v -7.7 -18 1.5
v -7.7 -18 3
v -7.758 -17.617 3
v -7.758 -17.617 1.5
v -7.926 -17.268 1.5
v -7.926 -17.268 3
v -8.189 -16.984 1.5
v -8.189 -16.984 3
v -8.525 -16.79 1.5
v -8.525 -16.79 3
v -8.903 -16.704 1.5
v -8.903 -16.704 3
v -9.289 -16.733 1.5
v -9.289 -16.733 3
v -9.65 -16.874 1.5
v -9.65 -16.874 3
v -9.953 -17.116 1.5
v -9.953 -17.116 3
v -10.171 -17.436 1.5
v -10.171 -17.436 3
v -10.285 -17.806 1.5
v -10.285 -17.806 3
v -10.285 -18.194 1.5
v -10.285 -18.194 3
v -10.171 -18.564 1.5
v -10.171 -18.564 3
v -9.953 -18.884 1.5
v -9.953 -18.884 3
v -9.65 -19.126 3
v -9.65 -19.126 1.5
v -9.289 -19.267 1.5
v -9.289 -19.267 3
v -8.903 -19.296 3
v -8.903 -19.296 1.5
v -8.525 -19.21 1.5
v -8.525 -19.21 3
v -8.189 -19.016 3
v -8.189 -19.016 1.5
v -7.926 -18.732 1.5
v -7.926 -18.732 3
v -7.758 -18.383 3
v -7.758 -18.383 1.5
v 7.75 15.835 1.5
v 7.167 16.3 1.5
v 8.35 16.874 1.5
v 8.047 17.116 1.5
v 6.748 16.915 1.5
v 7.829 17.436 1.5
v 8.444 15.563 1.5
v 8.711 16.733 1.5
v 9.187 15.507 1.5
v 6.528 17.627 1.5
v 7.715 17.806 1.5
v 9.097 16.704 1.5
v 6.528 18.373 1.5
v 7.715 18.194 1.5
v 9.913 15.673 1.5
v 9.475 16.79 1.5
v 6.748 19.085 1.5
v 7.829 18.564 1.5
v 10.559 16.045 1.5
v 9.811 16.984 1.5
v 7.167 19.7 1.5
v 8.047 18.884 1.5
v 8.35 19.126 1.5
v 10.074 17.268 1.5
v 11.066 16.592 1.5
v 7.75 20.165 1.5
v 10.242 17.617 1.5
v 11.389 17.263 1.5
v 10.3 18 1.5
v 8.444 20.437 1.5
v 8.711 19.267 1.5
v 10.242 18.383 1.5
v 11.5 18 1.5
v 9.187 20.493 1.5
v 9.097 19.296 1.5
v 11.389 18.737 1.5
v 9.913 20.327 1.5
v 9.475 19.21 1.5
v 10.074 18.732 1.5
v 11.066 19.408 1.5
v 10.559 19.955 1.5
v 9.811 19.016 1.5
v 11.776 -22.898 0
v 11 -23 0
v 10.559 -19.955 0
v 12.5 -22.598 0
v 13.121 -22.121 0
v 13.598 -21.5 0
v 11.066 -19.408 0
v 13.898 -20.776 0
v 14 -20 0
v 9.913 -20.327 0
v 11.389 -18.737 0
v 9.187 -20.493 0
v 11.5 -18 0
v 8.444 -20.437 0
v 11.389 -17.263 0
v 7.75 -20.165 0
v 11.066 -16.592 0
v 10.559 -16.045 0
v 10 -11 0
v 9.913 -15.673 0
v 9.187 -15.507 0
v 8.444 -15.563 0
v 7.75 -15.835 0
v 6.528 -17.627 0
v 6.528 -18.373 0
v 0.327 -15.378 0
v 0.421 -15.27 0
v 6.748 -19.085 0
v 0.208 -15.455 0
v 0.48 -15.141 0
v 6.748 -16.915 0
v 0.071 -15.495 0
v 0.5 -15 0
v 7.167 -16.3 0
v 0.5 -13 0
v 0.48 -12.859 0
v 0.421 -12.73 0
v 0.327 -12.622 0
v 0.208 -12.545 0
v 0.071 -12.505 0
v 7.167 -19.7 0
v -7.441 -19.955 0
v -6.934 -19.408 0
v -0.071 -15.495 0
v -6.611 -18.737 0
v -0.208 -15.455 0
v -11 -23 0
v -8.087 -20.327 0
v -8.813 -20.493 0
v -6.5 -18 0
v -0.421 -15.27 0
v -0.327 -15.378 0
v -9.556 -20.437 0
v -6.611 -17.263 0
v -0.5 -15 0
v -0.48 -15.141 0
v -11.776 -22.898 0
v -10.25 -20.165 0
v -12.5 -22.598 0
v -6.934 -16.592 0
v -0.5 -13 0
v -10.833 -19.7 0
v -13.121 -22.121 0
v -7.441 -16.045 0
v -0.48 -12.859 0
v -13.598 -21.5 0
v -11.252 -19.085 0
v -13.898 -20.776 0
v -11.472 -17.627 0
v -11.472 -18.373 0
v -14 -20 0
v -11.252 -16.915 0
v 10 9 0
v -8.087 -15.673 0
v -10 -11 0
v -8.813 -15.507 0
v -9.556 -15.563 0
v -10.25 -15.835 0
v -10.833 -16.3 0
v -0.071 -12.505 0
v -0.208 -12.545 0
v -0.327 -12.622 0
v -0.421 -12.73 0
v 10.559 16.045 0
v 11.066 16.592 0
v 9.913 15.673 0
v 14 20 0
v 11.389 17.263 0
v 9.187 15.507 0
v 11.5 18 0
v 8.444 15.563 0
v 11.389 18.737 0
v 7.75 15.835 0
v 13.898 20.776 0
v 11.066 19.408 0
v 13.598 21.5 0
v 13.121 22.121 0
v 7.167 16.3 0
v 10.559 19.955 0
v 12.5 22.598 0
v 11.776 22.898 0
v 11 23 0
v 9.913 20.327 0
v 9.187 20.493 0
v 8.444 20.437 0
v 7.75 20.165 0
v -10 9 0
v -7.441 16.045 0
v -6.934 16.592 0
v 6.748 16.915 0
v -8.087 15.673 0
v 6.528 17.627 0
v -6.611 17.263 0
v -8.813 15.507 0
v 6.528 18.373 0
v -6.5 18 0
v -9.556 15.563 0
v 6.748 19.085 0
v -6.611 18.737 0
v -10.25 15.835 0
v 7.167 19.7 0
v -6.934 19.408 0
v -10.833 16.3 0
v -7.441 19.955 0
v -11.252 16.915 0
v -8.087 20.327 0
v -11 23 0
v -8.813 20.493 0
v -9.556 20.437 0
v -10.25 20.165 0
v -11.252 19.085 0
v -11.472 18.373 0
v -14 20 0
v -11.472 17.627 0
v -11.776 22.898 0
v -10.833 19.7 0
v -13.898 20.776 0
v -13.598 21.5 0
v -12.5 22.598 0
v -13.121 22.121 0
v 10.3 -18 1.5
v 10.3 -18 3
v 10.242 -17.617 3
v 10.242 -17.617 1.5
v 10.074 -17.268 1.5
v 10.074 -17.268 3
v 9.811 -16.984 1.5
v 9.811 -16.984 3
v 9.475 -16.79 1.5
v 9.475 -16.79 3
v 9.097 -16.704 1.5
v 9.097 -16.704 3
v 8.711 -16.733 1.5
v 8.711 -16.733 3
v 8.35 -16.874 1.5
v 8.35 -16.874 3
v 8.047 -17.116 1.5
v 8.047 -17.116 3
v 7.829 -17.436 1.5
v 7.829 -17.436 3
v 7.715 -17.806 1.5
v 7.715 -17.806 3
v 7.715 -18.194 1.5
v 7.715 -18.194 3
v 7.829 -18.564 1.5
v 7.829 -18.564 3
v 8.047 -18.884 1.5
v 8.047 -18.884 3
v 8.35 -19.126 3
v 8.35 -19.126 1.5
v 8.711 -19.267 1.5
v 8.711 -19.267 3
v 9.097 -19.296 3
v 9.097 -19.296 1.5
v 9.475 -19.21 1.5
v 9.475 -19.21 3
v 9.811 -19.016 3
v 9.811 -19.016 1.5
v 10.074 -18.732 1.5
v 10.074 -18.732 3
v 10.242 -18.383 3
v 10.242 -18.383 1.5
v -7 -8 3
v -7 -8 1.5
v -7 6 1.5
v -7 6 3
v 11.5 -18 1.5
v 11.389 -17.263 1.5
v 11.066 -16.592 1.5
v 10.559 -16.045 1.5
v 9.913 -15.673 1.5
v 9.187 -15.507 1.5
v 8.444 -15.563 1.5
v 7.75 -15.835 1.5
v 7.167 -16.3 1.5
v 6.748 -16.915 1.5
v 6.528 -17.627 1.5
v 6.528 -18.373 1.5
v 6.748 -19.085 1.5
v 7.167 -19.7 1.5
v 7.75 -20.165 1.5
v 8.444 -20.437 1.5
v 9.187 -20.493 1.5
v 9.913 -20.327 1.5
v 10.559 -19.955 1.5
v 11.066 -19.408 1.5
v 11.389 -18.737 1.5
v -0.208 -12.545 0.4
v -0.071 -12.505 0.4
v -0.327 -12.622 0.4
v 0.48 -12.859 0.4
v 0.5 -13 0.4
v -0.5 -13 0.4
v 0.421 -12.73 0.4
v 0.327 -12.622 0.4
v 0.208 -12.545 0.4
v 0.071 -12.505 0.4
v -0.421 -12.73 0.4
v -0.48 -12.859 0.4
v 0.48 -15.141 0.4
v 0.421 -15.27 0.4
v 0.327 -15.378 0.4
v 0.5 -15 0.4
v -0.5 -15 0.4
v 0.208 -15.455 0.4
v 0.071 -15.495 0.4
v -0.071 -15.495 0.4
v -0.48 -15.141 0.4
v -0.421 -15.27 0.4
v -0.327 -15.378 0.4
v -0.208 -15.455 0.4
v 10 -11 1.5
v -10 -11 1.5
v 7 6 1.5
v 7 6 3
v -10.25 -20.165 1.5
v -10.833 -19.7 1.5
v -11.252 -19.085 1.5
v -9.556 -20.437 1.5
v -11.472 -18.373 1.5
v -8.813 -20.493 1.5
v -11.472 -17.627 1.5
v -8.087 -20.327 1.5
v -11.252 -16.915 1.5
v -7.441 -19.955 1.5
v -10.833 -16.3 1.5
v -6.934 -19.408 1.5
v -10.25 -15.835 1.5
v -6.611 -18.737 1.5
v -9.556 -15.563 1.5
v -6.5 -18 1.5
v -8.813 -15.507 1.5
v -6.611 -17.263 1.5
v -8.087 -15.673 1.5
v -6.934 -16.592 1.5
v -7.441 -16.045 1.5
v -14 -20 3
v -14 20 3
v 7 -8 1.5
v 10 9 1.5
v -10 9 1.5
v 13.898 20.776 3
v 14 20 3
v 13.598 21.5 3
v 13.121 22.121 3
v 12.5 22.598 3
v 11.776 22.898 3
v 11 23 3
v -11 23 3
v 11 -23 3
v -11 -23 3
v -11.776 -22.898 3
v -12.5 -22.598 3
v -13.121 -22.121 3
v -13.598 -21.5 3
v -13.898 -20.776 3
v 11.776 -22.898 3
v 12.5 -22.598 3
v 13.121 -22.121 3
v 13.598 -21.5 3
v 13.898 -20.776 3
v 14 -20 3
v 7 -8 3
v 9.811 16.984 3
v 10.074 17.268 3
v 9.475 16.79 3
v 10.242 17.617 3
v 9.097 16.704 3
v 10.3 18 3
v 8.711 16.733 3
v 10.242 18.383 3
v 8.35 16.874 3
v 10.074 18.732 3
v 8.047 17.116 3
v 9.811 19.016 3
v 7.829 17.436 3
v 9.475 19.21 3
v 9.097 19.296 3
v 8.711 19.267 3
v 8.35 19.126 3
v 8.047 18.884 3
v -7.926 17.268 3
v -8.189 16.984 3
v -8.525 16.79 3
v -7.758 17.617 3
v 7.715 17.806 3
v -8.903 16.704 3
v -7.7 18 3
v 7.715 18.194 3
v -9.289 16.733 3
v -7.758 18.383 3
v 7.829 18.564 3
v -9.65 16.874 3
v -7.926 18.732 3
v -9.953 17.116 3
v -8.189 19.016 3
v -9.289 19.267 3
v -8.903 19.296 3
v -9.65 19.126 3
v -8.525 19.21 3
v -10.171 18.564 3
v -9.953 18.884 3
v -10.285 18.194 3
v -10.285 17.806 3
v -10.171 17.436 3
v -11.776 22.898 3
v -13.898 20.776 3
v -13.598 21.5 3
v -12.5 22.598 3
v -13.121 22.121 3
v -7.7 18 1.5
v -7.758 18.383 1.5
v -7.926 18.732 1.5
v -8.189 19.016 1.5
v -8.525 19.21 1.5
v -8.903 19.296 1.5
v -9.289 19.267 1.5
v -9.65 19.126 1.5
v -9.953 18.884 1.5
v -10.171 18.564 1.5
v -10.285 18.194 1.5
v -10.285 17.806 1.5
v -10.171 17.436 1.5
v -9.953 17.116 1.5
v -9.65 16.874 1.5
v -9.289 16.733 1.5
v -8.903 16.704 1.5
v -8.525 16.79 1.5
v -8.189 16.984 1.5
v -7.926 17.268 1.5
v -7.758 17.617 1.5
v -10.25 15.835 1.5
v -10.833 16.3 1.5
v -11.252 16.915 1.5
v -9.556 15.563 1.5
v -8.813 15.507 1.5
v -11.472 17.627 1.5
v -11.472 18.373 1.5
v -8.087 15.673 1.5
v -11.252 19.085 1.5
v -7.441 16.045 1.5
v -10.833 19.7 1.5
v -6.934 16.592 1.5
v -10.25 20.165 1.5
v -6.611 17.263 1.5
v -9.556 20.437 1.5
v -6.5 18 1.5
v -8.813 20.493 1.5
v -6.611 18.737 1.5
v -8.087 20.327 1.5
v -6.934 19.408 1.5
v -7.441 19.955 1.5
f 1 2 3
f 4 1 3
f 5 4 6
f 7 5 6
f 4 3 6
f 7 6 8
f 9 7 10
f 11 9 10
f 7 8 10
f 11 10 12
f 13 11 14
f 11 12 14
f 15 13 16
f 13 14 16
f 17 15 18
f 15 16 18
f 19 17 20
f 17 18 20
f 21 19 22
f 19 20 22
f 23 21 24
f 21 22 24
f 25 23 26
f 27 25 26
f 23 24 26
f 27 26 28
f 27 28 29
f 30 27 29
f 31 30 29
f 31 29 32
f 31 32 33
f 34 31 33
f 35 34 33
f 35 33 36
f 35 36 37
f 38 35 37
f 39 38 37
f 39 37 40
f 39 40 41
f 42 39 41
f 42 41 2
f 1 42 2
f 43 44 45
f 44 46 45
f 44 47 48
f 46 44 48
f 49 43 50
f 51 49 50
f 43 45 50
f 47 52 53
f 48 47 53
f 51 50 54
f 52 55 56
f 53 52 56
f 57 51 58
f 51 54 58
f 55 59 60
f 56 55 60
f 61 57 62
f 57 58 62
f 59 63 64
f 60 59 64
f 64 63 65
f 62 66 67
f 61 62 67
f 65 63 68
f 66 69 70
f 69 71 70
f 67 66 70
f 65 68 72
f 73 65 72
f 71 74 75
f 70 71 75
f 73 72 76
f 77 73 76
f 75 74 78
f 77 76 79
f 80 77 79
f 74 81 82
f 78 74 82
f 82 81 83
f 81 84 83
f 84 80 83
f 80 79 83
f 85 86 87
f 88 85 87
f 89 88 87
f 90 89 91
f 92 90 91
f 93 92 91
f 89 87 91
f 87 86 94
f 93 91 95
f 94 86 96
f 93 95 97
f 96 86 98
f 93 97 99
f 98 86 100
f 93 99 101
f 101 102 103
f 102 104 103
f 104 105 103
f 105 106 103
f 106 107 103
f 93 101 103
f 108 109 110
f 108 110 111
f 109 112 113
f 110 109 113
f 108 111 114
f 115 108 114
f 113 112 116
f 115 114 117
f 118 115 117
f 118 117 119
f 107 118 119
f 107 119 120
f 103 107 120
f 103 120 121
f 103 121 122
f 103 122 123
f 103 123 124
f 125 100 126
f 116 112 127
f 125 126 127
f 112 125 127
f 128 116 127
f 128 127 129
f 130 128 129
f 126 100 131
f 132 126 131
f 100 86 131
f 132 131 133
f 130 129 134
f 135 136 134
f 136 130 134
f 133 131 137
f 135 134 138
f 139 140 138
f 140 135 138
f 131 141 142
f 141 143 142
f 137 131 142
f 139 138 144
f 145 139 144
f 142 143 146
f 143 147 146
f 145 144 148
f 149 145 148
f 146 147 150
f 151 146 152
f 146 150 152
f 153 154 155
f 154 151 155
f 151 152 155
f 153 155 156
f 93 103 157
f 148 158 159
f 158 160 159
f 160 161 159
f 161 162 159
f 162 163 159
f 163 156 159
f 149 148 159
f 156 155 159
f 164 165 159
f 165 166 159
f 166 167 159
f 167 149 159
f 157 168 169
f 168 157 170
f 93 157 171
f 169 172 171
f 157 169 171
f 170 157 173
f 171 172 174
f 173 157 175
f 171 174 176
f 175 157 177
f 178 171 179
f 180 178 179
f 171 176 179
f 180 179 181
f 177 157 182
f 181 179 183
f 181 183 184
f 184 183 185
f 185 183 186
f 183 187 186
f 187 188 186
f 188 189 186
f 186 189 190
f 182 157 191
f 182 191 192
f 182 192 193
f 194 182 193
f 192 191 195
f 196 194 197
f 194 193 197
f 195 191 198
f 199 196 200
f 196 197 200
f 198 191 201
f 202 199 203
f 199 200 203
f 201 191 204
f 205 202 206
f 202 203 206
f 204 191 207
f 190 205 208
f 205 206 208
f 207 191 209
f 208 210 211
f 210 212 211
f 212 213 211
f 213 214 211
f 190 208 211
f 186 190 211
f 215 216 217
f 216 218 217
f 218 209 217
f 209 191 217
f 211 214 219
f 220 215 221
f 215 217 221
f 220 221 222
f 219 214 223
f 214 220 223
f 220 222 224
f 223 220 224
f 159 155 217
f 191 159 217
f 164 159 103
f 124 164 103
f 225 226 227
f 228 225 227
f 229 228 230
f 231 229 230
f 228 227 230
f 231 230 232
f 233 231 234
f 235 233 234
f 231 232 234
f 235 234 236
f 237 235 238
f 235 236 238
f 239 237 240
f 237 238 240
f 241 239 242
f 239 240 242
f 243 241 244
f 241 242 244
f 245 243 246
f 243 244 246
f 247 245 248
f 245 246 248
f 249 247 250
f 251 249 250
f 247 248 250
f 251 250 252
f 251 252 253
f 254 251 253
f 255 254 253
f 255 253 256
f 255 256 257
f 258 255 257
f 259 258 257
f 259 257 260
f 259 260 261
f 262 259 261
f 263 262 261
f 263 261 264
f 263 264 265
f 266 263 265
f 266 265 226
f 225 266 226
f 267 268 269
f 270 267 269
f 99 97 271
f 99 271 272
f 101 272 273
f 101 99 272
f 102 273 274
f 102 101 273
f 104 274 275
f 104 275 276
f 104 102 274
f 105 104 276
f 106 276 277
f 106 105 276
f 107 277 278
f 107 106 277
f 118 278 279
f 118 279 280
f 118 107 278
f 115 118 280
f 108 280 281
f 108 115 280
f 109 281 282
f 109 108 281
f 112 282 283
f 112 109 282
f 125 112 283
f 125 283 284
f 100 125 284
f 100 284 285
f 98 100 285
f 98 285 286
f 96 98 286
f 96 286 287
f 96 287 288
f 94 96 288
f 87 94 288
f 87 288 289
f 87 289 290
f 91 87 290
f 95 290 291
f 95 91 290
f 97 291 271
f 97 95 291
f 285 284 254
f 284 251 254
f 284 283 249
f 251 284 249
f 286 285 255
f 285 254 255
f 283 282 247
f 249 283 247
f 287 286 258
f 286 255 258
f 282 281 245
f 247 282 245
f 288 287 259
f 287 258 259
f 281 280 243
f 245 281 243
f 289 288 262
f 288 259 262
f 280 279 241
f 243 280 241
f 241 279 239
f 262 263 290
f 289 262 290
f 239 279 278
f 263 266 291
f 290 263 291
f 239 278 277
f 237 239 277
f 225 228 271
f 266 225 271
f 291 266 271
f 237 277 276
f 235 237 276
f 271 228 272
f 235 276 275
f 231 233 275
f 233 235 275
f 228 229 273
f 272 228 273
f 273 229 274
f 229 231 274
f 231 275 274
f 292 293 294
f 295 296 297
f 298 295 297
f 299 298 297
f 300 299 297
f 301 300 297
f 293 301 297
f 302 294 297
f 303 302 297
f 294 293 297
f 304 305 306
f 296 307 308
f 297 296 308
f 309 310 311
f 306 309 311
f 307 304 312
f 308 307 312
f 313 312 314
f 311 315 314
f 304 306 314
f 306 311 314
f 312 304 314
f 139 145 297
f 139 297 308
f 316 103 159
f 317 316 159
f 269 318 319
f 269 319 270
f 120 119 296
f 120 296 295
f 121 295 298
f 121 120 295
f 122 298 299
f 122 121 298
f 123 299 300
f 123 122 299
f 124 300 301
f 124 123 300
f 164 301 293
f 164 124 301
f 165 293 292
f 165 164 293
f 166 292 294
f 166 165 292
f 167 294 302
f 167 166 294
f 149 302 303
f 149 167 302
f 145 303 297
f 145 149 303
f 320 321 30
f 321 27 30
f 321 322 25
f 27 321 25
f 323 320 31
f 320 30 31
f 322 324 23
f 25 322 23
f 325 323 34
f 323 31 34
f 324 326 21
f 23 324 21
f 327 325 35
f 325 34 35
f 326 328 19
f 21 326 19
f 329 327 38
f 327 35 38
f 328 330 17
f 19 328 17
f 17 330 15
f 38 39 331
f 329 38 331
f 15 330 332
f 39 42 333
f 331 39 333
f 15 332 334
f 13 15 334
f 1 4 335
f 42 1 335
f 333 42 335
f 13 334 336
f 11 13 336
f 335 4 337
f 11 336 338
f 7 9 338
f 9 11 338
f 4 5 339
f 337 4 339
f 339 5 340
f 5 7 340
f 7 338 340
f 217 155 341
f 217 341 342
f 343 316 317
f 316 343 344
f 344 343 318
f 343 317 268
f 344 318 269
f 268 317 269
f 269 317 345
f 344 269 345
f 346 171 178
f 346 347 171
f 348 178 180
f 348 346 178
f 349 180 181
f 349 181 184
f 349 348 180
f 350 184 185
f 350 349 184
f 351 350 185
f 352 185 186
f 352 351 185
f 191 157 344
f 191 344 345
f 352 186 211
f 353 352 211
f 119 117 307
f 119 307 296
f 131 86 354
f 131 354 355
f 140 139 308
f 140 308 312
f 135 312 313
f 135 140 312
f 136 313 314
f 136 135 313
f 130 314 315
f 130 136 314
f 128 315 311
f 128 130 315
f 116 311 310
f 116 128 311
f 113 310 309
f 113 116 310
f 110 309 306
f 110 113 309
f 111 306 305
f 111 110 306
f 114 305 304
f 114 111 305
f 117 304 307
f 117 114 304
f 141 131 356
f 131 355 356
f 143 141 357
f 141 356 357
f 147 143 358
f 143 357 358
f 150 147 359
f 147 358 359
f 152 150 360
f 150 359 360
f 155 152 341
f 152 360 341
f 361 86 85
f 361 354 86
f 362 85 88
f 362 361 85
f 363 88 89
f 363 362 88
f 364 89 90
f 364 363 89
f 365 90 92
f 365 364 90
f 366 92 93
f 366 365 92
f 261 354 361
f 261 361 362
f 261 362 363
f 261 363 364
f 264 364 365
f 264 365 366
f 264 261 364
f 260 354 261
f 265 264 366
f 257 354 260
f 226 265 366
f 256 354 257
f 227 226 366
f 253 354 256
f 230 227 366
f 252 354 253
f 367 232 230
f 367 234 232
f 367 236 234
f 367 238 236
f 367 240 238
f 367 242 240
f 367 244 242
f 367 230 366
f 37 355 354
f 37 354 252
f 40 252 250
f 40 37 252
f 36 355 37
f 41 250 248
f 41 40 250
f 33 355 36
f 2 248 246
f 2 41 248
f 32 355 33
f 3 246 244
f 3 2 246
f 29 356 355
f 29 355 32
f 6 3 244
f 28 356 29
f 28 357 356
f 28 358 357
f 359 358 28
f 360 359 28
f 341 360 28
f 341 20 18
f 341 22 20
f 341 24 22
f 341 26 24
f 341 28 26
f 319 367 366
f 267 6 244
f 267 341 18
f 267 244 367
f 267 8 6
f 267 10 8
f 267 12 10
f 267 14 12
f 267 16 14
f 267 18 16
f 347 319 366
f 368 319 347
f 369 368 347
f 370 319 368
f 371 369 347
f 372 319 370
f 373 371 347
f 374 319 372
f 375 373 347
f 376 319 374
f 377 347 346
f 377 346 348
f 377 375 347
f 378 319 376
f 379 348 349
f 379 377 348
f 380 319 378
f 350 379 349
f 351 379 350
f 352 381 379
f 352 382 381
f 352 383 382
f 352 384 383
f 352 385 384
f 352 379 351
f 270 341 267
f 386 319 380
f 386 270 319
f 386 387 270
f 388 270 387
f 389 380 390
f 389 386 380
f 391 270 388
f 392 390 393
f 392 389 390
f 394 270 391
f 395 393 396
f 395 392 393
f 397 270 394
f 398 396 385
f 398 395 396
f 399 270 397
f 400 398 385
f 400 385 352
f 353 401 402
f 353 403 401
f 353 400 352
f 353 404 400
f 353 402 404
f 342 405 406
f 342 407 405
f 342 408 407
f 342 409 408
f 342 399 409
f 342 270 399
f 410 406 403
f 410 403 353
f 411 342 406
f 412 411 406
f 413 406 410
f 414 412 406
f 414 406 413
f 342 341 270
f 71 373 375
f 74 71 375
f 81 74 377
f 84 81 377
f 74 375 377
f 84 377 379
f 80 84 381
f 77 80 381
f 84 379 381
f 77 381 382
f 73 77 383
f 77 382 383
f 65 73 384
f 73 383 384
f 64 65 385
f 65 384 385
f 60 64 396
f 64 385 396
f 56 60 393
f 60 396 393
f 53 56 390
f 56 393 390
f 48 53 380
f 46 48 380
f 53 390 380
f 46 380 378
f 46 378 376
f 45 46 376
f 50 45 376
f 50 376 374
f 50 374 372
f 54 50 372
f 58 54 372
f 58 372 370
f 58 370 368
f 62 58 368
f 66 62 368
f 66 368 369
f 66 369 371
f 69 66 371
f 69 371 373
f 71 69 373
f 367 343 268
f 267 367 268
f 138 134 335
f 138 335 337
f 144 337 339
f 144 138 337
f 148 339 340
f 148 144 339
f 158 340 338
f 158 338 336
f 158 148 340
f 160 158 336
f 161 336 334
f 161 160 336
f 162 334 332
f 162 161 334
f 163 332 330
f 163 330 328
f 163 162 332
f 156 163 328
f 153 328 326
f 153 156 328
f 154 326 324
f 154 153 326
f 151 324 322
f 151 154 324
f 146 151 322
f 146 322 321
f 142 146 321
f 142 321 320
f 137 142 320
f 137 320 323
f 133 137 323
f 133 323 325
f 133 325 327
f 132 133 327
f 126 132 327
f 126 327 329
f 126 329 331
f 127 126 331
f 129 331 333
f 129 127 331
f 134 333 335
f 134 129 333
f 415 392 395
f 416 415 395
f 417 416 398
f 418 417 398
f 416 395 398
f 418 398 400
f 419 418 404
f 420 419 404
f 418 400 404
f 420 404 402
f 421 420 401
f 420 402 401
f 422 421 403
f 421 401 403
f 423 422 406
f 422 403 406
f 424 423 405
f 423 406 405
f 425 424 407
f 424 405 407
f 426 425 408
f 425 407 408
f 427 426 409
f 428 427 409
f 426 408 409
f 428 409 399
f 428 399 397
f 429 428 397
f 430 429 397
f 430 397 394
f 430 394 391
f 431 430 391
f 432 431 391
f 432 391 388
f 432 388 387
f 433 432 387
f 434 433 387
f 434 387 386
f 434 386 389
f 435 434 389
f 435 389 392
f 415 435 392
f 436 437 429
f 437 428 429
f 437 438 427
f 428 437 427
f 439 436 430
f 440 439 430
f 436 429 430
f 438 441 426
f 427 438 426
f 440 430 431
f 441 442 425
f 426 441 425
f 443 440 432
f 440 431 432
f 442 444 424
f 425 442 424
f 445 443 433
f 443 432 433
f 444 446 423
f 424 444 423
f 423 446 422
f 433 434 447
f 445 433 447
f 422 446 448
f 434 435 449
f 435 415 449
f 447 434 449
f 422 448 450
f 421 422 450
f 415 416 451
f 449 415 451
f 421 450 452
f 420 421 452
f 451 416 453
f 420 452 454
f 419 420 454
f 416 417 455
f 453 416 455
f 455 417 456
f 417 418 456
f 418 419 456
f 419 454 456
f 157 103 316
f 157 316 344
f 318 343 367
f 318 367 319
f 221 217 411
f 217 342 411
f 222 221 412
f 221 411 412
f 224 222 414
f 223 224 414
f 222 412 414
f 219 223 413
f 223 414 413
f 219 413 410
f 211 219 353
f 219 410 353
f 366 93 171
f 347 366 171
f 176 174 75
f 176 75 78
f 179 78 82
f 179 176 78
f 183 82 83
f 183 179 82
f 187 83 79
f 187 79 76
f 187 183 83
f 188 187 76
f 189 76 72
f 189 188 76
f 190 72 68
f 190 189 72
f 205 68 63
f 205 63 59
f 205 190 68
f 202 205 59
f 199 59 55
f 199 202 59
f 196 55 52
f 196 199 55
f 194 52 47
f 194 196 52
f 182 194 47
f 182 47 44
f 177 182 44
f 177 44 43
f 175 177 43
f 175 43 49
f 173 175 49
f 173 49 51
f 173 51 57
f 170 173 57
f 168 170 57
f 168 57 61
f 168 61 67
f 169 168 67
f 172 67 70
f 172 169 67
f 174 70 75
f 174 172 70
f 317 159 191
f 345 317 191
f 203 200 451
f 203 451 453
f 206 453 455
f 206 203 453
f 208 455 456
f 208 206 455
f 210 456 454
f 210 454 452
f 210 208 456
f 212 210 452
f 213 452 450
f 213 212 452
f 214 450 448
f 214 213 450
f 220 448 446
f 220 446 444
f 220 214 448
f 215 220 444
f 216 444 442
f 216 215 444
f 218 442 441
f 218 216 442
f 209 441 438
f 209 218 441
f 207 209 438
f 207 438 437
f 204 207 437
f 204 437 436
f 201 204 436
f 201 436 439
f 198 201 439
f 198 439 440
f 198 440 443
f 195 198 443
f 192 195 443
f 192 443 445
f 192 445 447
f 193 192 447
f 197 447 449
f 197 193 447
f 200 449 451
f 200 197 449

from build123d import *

# Parameters (mm, degrees)
SKETCH2_W                  = 46
SKETCH2_H                  = 28
SKETCH2_W_2                = 14
SKETCH2_H_2                = 14
BOSS_EXTRUDE1_DEPTH        = 3
F_2_6_2_6_DIAMETER_HOLE1_D = 2.6
SKETCH2_6_W                = 20
SKETCH2_6_H                = 20
SKETCH2_6_R                = 2.5
CUT_EXTRUDE2_DEPTH         = 1.5
FILLET1_R                  = 3
CUT_EXTRUDE3_DEPTH         = 0.4


with BuildPart() as part:
    # Sketch2 → Boss-Extrude1 (new body)
    with BuildSketch(Plane(origin=(0, 0, 0), x_dir=(0, 1, 0), z_dir=(0, 0, 1))):
        Rectangle(SKETCH2_W, SKETCH2_H)
        with Locations((-1, 0)):
            Rectangle(SKETCH2_W_2, SKETCH2_H_2, mode=Mode.SUBTRACT)
    extrude(amount=BOSS_EXTRUDE1_DEPTH)

    # Ø2.6 (2.6) Diameter Hole1 (through all)
    with Locations(Plane(origin=(0, 0, 0), x_dir=(-1, 0, 0), z_dir=(0, 0, -1))):
        with Locations((-9, -18), (9, -18), (-9, 18), (9, 18)):
            Hole(F_2_6_2_6_DIAMETER_HOLE1_D / 2)

    # Sketch2<6> → Cut-Extrude2 (cut)
    with BuildSketch(Plane(origin=(0, 0, 0), x_dir=(0, 1, 0), z_dir=(0, 0, 1))):
        with Locations((-1, 0)):
            Rectangle(SKETCH2_6_W, SKETCH2_6_H)
        with Locations((-18, 9)):
            Circle(SKETCH2_6_R)
        with Locations((18, 9)):
            Circle(SKETCH2_6_R)
        with Locations((18, -9)):
            Circle(SKETCH2_6_R)
        with Locations((-18, -9)):
            Circle(SKETCH2_6_R)
    extrude(amount=CUT_EXTRUDE2_DEPTH, mode=Mode.SUBTRACT)

    # Fillet1
    fillet1_edges = [part.edges().sort_by_distance(p)[0] for p in [
        (14, 23, 1.5),
        (14, -23, 1.5),
        (-14, -23, 1.5),
        (-14, 23, 1.5),
    ]]
    fillet(fillet1_edges, radius=FILLET1_R)

    # Sketch6 → Cut-Extrude3 (cut)
    with BuildSketch(Plane(origin=(0, 0, 0), x_dir=(1, 0, 0), z_dir=(0, 0, -1))):
        with BuildLine():
            Line((0.5, 15), (0.5, 13))
            ThreePointArc((0.5, 13), (0, 12.5), (-0.5, 13))
            Line((-0.5, 13), (-0.5, 15))
            ThreePointArc((-0.5, 15), (0, 15.5), (0.5, 15))
        make_face()
    extrude(amount=-CUT_EXTRUDE3_DEPTH, mode=Mode.SUBTRACT)


solid = part.part
